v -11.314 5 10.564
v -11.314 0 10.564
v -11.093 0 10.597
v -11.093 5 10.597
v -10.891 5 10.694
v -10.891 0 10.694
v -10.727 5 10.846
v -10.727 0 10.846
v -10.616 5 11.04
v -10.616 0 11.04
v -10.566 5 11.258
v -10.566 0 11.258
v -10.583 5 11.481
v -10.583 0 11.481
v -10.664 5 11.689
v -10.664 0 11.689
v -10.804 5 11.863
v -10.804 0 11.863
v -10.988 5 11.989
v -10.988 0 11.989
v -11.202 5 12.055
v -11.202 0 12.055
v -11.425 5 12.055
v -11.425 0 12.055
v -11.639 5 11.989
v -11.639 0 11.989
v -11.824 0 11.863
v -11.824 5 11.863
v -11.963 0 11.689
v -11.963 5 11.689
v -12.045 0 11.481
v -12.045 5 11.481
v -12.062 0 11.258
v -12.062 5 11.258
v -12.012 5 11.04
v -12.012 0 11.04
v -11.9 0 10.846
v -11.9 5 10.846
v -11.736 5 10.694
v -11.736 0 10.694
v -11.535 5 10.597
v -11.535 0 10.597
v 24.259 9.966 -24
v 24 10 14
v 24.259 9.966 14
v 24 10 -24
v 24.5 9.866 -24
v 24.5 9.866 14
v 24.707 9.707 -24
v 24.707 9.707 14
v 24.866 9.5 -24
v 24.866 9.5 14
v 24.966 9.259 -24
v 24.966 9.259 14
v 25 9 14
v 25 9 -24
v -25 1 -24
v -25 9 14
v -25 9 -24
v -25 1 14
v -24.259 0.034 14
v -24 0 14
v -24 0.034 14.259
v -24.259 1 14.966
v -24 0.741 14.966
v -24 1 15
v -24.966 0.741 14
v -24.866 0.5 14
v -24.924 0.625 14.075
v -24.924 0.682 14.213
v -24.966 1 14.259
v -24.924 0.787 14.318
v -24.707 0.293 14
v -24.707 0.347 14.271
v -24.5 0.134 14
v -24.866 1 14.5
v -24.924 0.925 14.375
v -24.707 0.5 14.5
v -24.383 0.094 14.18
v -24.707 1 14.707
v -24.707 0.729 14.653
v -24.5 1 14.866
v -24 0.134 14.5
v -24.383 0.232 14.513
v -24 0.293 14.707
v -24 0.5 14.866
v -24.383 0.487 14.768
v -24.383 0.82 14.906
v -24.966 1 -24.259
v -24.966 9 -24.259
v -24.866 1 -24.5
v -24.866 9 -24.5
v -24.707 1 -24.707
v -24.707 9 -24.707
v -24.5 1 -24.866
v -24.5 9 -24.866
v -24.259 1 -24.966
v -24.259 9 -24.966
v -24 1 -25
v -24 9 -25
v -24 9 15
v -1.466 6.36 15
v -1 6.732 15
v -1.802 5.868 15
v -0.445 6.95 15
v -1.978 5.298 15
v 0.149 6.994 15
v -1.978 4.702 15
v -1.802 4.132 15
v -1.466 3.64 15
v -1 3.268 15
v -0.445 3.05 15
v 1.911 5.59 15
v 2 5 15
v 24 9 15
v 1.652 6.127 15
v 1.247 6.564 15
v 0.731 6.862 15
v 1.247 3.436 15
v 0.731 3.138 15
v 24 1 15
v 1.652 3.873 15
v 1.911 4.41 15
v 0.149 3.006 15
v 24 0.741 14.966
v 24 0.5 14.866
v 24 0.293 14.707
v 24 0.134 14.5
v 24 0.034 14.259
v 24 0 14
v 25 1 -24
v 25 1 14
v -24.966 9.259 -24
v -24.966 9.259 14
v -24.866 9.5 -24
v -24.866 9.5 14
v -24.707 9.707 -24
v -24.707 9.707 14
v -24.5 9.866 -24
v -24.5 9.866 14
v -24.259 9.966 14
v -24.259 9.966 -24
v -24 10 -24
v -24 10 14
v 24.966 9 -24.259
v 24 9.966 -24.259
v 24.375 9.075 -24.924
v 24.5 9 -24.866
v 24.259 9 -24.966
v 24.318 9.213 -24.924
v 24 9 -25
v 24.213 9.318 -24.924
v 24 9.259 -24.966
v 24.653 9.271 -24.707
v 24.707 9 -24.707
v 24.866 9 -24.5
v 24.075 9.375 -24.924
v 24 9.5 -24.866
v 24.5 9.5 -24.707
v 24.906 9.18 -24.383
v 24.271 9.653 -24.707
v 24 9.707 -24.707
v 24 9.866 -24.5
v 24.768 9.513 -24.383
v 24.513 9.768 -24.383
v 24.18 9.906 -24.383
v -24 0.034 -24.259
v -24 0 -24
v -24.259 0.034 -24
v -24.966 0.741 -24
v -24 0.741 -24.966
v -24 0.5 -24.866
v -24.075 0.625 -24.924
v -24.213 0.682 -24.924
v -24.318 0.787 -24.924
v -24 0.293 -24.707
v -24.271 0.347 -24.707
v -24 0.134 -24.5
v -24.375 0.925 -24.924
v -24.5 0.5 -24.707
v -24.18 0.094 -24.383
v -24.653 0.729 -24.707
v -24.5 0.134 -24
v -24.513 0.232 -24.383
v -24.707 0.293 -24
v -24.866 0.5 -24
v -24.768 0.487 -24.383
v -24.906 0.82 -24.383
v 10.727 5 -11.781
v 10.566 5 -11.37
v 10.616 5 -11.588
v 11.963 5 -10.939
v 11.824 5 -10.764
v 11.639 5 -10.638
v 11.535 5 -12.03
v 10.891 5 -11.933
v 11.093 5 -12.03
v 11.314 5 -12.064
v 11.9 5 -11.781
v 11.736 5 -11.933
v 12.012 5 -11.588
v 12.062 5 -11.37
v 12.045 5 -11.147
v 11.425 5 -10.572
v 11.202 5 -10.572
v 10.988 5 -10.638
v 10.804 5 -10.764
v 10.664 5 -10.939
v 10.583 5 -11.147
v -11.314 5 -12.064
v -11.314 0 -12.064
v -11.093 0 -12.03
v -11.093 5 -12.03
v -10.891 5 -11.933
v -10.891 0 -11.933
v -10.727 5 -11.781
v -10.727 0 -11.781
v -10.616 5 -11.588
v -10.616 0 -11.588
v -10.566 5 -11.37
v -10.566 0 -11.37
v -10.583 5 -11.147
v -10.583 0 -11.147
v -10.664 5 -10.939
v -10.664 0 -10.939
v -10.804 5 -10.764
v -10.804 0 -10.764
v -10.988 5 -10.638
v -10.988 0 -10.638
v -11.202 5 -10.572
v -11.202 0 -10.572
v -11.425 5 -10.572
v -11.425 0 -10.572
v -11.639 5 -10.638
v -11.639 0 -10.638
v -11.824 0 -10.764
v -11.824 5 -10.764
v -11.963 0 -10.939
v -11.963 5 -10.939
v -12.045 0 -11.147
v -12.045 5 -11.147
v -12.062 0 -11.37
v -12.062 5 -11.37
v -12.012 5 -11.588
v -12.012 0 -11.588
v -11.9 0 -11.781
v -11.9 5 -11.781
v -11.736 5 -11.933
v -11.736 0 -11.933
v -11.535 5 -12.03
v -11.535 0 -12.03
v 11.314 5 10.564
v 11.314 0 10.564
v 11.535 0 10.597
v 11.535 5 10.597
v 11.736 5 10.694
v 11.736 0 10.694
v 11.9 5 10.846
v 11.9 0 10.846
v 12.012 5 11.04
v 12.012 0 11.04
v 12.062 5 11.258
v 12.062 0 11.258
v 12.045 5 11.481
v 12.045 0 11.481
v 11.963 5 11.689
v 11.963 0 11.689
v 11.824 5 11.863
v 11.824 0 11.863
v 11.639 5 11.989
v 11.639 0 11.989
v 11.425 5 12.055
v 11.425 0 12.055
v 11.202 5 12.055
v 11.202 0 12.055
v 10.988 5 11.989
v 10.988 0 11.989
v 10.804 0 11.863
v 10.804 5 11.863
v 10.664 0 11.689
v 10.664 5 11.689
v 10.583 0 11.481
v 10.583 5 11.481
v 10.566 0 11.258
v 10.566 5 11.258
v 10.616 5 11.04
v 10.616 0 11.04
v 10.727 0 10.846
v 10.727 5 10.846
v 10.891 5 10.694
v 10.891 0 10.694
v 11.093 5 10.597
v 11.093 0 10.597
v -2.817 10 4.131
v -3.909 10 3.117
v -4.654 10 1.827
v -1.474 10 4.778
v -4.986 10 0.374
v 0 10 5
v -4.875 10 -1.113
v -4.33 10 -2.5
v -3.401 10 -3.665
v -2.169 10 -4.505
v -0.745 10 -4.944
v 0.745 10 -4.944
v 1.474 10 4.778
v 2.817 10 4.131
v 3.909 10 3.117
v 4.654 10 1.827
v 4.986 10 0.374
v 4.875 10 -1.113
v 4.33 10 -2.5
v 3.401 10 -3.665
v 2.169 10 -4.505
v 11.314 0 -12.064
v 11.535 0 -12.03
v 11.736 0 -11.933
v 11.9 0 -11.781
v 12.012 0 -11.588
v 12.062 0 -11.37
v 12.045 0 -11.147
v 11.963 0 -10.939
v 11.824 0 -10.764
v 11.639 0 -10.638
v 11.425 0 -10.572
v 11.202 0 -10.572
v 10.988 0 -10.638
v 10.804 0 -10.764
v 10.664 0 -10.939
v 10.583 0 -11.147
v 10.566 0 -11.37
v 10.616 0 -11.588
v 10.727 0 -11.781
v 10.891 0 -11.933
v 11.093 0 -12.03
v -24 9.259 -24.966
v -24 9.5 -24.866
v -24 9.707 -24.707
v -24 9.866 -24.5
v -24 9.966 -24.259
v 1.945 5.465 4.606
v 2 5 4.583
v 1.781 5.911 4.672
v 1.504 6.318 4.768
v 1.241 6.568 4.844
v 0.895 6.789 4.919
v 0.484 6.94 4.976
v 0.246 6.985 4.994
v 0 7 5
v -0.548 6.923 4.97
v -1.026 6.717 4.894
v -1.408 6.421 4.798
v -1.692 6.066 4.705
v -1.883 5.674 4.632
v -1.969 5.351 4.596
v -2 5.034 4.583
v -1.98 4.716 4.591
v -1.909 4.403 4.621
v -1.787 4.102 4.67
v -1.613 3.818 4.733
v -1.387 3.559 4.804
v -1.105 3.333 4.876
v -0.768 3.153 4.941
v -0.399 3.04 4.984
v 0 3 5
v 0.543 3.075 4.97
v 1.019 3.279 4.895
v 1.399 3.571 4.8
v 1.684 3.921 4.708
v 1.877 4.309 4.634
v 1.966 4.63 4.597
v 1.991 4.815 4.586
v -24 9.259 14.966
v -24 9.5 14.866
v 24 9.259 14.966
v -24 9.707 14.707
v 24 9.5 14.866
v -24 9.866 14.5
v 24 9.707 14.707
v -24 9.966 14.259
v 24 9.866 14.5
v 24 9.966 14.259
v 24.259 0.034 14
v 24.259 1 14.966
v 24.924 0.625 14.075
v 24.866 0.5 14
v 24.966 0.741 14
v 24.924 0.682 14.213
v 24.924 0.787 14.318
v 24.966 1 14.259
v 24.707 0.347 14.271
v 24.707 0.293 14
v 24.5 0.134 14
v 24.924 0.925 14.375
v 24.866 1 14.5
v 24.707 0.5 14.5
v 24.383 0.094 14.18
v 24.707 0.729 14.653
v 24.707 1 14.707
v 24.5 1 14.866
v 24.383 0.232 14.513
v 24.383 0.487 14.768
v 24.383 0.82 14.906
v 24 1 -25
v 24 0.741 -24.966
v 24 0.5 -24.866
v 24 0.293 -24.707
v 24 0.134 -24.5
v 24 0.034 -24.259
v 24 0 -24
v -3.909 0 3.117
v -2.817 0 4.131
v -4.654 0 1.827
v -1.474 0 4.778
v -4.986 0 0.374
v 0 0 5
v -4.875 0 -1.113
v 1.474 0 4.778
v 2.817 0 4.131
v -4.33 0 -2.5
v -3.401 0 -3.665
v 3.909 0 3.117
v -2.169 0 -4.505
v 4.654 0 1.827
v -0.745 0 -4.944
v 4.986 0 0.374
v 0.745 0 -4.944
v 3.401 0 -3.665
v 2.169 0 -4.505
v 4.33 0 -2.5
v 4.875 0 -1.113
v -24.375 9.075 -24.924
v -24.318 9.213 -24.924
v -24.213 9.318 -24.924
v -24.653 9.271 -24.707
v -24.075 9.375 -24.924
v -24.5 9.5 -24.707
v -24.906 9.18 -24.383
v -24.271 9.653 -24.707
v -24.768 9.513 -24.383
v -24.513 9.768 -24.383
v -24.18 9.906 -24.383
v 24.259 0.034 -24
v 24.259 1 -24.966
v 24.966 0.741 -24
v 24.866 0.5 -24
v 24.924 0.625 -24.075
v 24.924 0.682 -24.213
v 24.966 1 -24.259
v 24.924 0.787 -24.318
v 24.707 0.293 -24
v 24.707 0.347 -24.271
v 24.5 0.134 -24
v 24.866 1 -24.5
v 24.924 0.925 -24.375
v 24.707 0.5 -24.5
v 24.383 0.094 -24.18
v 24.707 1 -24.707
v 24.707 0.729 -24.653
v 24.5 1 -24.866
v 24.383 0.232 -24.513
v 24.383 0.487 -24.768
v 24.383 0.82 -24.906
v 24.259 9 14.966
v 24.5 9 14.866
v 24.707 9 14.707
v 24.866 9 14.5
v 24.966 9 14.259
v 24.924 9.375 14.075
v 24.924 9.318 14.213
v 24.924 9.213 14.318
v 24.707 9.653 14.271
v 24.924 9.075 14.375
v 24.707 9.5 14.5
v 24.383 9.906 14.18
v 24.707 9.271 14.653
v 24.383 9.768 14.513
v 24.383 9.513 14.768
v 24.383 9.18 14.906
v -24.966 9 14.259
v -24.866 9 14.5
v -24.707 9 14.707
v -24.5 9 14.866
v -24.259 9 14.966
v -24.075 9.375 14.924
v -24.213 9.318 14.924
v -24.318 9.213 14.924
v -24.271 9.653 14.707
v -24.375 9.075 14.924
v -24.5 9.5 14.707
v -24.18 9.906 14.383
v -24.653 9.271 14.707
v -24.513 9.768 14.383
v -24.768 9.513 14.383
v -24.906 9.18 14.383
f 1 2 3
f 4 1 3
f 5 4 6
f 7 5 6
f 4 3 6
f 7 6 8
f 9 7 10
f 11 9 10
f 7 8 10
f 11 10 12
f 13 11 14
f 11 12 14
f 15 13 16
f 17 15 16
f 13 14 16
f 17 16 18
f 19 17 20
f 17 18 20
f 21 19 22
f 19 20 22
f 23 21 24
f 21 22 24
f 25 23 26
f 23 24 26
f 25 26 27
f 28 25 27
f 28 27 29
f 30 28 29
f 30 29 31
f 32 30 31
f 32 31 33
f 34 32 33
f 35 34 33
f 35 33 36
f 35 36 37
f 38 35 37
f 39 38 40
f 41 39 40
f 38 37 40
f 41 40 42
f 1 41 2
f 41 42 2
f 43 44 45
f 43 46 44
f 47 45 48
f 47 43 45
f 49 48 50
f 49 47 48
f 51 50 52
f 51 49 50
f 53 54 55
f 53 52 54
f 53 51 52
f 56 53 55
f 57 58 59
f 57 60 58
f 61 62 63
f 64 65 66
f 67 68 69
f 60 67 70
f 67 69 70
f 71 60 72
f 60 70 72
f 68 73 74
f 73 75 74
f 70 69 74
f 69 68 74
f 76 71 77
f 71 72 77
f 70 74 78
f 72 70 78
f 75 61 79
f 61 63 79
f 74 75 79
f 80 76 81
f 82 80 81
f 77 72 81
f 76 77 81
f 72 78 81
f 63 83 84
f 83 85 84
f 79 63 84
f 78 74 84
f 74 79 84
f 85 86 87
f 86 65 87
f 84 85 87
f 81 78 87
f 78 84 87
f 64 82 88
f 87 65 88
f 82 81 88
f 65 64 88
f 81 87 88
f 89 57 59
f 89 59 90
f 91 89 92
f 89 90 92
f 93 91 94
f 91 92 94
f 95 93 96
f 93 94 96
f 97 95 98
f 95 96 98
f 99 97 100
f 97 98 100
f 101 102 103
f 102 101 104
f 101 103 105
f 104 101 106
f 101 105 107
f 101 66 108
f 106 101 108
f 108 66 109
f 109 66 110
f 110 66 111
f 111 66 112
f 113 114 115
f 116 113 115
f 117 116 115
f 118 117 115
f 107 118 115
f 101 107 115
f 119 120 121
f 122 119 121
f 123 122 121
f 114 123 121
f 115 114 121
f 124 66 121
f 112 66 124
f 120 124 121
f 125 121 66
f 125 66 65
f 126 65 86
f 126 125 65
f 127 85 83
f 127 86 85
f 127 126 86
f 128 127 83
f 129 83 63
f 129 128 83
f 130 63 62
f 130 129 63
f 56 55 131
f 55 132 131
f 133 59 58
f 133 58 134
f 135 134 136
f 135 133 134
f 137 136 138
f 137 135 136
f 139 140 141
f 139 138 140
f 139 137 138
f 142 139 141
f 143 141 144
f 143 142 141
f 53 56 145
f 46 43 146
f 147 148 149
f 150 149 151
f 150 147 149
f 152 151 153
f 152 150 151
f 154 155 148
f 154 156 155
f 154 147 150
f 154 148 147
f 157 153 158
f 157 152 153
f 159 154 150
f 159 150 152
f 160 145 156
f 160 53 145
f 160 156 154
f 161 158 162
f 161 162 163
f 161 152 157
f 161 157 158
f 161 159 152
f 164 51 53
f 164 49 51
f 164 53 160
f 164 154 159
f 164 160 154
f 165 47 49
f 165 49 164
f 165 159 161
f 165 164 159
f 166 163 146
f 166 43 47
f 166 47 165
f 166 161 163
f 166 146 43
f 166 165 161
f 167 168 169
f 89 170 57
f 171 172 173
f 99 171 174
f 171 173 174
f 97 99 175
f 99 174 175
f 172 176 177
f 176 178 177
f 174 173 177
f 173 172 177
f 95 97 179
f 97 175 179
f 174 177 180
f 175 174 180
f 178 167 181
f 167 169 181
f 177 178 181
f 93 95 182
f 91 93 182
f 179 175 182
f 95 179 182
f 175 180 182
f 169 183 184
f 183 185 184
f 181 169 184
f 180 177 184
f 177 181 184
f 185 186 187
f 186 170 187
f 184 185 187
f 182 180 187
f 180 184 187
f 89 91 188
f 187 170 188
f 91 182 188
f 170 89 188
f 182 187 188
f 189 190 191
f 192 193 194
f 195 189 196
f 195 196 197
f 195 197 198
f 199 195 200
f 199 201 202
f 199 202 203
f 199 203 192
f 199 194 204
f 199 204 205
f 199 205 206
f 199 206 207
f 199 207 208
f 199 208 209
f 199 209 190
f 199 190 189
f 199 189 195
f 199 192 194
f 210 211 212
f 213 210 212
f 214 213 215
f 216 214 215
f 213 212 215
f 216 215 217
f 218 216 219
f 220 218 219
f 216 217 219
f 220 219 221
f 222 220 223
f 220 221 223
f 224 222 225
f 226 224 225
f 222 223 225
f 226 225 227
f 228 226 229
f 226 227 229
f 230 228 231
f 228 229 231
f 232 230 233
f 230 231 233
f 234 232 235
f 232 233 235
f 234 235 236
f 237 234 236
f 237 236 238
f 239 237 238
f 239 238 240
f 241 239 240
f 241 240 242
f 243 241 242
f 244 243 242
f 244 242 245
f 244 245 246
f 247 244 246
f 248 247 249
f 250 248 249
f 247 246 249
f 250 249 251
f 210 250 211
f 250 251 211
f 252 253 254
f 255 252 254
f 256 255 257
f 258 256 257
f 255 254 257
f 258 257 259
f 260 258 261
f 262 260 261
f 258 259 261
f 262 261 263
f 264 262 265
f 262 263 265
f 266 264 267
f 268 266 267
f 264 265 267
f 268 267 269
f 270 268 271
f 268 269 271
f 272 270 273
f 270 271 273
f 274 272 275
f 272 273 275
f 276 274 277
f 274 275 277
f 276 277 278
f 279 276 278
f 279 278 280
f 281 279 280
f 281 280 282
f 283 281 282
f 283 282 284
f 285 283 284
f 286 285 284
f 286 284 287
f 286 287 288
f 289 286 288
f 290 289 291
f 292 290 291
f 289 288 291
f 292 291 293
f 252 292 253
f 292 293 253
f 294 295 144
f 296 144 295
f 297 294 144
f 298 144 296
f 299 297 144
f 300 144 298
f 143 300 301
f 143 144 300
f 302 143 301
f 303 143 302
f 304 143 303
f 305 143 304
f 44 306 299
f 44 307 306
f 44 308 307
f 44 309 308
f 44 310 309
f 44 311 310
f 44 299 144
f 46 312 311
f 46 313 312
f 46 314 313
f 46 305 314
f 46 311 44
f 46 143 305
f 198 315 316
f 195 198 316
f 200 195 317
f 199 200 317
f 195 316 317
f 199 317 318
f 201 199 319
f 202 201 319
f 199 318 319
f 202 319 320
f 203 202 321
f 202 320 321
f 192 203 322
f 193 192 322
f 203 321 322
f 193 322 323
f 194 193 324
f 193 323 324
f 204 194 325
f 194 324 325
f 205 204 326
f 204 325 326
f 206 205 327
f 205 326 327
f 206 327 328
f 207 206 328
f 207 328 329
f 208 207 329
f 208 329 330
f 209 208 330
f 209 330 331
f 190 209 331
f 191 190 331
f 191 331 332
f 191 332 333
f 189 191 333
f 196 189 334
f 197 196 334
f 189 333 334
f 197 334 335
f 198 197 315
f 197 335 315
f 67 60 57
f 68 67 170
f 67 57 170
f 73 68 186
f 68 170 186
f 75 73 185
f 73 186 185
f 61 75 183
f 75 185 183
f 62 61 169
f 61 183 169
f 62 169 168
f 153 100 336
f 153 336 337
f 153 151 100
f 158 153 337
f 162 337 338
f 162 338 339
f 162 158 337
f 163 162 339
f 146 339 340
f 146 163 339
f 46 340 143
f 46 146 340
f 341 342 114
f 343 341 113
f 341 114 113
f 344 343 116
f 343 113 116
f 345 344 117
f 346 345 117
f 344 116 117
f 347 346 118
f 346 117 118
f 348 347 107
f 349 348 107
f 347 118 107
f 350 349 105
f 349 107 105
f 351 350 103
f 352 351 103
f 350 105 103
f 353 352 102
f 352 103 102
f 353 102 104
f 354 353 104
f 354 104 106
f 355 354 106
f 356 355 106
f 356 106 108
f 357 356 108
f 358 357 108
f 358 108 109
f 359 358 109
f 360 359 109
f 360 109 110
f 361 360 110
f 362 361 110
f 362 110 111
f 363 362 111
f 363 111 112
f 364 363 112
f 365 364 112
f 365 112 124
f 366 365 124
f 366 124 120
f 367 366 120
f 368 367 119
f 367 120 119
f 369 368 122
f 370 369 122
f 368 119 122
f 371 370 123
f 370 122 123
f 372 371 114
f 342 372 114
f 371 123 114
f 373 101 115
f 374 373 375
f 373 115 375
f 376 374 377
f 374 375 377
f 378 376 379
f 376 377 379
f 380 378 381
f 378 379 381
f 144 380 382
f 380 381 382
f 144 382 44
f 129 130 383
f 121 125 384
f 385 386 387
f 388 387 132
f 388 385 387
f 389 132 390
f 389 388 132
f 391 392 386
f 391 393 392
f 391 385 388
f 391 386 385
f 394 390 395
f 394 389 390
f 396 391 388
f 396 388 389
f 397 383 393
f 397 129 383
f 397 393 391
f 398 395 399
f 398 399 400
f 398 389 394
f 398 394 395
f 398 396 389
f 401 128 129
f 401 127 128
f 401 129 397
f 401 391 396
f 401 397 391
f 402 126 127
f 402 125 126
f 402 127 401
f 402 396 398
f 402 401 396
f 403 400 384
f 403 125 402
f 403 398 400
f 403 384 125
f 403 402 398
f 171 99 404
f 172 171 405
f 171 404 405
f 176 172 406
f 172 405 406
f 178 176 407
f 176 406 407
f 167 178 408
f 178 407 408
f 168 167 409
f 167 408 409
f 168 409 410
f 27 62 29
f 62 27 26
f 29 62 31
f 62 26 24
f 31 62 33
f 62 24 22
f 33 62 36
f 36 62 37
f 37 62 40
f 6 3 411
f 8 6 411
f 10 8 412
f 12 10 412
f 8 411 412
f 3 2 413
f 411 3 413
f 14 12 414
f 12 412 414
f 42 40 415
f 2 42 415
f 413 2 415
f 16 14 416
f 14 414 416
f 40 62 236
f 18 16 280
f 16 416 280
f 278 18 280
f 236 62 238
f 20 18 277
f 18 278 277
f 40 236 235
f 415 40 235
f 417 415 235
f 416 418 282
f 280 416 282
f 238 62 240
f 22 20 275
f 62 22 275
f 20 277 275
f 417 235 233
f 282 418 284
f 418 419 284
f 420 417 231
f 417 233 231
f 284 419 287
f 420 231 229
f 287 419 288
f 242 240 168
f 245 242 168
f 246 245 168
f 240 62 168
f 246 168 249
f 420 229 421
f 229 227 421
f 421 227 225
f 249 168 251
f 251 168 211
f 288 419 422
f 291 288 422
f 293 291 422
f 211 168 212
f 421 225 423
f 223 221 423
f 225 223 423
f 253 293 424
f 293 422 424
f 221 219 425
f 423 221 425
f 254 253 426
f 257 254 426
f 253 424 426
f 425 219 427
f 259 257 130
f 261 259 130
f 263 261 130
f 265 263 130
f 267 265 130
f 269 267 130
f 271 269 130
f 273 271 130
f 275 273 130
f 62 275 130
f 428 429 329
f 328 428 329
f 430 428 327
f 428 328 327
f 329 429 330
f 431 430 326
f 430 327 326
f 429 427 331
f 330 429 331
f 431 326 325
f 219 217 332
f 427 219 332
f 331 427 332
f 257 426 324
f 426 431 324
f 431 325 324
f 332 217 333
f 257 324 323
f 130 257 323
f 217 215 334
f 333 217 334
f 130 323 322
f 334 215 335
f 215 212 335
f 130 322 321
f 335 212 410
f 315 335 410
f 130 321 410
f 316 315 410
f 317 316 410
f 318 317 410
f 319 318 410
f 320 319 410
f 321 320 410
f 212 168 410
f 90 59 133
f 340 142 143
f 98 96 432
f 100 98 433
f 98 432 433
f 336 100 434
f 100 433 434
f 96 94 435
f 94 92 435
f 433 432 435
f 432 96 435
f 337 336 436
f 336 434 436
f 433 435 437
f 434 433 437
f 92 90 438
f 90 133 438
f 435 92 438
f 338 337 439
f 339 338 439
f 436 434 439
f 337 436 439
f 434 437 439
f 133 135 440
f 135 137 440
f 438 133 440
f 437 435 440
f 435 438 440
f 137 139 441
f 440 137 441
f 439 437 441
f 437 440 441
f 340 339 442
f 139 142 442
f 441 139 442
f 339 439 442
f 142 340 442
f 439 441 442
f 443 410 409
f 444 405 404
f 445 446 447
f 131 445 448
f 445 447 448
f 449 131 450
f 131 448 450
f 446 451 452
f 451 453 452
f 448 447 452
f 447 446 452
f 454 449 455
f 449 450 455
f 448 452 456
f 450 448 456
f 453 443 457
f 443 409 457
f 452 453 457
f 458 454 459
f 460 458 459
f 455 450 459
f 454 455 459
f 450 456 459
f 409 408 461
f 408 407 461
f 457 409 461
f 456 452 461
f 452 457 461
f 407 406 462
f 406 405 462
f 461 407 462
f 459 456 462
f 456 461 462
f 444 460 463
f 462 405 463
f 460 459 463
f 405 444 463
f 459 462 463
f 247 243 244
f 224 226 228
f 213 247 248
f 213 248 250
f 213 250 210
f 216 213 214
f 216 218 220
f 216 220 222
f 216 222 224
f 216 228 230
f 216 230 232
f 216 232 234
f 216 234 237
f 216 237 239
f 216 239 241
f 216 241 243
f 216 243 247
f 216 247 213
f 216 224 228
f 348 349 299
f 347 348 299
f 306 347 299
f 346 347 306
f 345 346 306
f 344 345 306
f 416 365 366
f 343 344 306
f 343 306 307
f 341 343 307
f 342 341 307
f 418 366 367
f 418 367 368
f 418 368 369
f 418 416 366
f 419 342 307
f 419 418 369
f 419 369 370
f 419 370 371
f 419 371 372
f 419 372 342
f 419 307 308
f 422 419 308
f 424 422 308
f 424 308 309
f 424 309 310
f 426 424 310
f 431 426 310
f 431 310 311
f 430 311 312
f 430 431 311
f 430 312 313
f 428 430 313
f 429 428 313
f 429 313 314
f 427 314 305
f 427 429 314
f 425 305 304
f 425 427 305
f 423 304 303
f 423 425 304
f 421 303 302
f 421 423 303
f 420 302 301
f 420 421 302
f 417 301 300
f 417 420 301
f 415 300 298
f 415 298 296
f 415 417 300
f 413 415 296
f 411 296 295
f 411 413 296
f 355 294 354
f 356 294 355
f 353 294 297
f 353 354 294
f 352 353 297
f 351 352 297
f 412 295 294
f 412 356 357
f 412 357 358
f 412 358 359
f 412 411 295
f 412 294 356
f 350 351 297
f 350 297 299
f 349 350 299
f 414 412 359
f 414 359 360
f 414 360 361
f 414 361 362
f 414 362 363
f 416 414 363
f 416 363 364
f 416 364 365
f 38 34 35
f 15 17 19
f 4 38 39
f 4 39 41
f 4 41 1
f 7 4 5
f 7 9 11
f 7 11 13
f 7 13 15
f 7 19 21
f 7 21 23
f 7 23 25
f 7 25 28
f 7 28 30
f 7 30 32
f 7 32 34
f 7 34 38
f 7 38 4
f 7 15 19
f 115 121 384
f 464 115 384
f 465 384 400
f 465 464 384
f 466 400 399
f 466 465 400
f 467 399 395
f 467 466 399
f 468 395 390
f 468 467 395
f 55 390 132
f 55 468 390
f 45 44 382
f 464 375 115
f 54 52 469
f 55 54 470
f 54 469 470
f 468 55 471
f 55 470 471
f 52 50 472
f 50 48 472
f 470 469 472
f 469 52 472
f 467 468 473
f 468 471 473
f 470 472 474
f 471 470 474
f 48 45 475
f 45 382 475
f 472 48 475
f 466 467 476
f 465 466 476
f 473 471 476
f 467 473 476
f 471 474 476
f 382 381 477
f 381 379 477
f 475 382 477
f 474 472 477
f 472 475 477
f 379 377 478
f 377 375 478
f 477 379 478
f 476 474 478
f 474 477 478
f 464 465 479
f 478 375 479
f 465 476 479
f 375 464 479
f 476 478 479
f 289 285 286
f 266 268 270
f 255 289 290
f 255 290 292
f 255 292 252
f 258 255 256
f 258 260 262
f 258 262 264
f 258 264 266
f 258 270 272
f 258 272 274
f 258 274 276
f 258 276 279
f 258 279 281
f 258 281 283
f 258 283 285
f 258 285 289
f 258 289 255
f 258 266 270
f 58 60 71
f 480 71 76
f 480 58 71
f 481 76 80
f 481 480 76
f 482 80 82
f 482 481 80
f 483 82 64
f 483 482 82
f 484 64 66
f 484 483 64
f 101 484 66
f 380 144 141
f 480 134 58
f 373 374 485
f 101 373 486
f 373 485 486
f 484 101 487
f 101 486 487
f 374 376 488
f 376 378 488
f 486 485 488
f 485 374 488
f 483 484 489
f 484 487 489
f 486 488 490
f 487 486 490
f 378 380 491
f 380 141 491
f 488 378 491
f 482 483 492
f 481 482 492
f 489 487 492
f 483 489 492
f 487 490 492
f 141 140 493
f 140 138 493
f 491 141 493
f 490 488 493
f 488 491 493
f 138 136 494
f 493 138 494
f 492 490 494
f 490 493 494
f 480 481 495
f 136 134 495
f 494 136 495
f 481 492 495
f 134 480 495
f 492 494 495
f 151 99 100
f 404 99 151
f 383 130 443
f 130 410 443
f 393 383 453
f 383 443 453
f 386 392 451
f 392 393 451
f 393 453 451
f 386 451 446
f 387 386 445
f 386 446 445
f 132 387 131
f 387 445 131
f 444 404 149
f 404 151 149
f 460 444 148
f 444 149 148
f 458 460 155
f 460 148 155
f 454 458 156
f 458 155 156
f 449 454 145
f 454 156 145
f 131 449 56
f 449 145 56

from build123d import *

# Parameters (mm, degrees)
SKETCH1_W               = 50
SKETCH1_H               = 40
SKETCH1_R               = 5
BOSS_EXTRUDE1_DEPTH     = 10
SKETCH2_R               = 0.75
CUT_EXTRUDE1_DEPTH      = 5
CUT_EXTRUDE2_REACH      = 50.218
CUT_EXTRUDE2_END_RADIUS = 5
SKETCH3_R               = 2
FILLET1_R               = 1


with BuildPart() as part:
    # Sketch1 → Boss-Extrude1 (new body)
    with BuildSketch(Plane(origin=(0, 0, 0), x_dir=(1, 0, 0), z_dir=(0, 1, 0))):
        with Locations((0, 5)):
            Rectangle(SKETCH1_W, SKETCH1_H)
        with Locations(Location((0, 0, 0), (0, 0, 270))):
            Circle(SKETCH1_R, mode=Mode.SUBTRACT)
    extrude(amount=BOSS_EXTRUDE1_DEPTH)

    # Sketch2 → Cut-Extrude1 (cut)
    with BuildSketch(Plane.XZ):
        with Locations(Location((-11.313708499, 11.313708499, 0), (0, 0, 270))):
            Circle(SKETCH2_R)
        with Locations(Location((11.313708499, 11.313708499, 0), (0, 0, 270))):
            Circle(SKETCH2_R)
        with Locations(Location((11.313708499, -11.313708499, 0), (0, 0, 270))):
            Circle(SKETCH2_R)
        with Locations(Location((-11.313708499, -11.313708499, 0), (0, 0, 270))):
            Circle(SKETCH2_R)
    extrude(amount=-CUT_EXTRUDE1_DEPTH, mode=Mode.SUBTRACT)

    # Cut-Extrude2: up to this cylinder (the profile starts outside it)
    cut_extrude2_end = Plane(origin=(0, 5, 0), z_dir=(0, -1, 0)) * Cylinder(CUT_EXTRUDE2_END_RADIUS, 111.436, mode=Mode.PRIVATE)
    # Sketch3 → Cut-Extrude2 (cut, up to the surface)
    with BuildSketch(Plane.XY.offset(15), mode=Mode.PRIVATE) as cut_extrude2_sk1:
        with Locations((0, 5)):
            Circle(SKETCH3_R)
    cut_extrude2_tool1 = extrude(cut_extrude2_sk1.sketch, amount=-CUT_EXTRUDE2_REACH, mode=Mode.PRIVATE) - cut_extrude2_end
    add(cut_extrude2_tool1.solids().sort_by_distance((0, 5, 15))[0], mode=Mode.SUBTRACT)

    # Fillet1
    fillet1_edges = [part.edges().sort_by_distance(p)[0] for p in [
        (-25, 10, -5),
        (0, 10, 15),
        (25, 10, -5),
        (0, 0, 15),
        (-25, 0, -5),
        (0, 0, -25),
        (25, 0, -5),
        (25, 5, 15),
        (-25, 5, 15),
        (-25, 5, -25),
        (25, 5, -25),
        (0, 10, -25),
    ]]
    fillet(fillet1_edges, radius=FILLET1_R)


solid = part.part
